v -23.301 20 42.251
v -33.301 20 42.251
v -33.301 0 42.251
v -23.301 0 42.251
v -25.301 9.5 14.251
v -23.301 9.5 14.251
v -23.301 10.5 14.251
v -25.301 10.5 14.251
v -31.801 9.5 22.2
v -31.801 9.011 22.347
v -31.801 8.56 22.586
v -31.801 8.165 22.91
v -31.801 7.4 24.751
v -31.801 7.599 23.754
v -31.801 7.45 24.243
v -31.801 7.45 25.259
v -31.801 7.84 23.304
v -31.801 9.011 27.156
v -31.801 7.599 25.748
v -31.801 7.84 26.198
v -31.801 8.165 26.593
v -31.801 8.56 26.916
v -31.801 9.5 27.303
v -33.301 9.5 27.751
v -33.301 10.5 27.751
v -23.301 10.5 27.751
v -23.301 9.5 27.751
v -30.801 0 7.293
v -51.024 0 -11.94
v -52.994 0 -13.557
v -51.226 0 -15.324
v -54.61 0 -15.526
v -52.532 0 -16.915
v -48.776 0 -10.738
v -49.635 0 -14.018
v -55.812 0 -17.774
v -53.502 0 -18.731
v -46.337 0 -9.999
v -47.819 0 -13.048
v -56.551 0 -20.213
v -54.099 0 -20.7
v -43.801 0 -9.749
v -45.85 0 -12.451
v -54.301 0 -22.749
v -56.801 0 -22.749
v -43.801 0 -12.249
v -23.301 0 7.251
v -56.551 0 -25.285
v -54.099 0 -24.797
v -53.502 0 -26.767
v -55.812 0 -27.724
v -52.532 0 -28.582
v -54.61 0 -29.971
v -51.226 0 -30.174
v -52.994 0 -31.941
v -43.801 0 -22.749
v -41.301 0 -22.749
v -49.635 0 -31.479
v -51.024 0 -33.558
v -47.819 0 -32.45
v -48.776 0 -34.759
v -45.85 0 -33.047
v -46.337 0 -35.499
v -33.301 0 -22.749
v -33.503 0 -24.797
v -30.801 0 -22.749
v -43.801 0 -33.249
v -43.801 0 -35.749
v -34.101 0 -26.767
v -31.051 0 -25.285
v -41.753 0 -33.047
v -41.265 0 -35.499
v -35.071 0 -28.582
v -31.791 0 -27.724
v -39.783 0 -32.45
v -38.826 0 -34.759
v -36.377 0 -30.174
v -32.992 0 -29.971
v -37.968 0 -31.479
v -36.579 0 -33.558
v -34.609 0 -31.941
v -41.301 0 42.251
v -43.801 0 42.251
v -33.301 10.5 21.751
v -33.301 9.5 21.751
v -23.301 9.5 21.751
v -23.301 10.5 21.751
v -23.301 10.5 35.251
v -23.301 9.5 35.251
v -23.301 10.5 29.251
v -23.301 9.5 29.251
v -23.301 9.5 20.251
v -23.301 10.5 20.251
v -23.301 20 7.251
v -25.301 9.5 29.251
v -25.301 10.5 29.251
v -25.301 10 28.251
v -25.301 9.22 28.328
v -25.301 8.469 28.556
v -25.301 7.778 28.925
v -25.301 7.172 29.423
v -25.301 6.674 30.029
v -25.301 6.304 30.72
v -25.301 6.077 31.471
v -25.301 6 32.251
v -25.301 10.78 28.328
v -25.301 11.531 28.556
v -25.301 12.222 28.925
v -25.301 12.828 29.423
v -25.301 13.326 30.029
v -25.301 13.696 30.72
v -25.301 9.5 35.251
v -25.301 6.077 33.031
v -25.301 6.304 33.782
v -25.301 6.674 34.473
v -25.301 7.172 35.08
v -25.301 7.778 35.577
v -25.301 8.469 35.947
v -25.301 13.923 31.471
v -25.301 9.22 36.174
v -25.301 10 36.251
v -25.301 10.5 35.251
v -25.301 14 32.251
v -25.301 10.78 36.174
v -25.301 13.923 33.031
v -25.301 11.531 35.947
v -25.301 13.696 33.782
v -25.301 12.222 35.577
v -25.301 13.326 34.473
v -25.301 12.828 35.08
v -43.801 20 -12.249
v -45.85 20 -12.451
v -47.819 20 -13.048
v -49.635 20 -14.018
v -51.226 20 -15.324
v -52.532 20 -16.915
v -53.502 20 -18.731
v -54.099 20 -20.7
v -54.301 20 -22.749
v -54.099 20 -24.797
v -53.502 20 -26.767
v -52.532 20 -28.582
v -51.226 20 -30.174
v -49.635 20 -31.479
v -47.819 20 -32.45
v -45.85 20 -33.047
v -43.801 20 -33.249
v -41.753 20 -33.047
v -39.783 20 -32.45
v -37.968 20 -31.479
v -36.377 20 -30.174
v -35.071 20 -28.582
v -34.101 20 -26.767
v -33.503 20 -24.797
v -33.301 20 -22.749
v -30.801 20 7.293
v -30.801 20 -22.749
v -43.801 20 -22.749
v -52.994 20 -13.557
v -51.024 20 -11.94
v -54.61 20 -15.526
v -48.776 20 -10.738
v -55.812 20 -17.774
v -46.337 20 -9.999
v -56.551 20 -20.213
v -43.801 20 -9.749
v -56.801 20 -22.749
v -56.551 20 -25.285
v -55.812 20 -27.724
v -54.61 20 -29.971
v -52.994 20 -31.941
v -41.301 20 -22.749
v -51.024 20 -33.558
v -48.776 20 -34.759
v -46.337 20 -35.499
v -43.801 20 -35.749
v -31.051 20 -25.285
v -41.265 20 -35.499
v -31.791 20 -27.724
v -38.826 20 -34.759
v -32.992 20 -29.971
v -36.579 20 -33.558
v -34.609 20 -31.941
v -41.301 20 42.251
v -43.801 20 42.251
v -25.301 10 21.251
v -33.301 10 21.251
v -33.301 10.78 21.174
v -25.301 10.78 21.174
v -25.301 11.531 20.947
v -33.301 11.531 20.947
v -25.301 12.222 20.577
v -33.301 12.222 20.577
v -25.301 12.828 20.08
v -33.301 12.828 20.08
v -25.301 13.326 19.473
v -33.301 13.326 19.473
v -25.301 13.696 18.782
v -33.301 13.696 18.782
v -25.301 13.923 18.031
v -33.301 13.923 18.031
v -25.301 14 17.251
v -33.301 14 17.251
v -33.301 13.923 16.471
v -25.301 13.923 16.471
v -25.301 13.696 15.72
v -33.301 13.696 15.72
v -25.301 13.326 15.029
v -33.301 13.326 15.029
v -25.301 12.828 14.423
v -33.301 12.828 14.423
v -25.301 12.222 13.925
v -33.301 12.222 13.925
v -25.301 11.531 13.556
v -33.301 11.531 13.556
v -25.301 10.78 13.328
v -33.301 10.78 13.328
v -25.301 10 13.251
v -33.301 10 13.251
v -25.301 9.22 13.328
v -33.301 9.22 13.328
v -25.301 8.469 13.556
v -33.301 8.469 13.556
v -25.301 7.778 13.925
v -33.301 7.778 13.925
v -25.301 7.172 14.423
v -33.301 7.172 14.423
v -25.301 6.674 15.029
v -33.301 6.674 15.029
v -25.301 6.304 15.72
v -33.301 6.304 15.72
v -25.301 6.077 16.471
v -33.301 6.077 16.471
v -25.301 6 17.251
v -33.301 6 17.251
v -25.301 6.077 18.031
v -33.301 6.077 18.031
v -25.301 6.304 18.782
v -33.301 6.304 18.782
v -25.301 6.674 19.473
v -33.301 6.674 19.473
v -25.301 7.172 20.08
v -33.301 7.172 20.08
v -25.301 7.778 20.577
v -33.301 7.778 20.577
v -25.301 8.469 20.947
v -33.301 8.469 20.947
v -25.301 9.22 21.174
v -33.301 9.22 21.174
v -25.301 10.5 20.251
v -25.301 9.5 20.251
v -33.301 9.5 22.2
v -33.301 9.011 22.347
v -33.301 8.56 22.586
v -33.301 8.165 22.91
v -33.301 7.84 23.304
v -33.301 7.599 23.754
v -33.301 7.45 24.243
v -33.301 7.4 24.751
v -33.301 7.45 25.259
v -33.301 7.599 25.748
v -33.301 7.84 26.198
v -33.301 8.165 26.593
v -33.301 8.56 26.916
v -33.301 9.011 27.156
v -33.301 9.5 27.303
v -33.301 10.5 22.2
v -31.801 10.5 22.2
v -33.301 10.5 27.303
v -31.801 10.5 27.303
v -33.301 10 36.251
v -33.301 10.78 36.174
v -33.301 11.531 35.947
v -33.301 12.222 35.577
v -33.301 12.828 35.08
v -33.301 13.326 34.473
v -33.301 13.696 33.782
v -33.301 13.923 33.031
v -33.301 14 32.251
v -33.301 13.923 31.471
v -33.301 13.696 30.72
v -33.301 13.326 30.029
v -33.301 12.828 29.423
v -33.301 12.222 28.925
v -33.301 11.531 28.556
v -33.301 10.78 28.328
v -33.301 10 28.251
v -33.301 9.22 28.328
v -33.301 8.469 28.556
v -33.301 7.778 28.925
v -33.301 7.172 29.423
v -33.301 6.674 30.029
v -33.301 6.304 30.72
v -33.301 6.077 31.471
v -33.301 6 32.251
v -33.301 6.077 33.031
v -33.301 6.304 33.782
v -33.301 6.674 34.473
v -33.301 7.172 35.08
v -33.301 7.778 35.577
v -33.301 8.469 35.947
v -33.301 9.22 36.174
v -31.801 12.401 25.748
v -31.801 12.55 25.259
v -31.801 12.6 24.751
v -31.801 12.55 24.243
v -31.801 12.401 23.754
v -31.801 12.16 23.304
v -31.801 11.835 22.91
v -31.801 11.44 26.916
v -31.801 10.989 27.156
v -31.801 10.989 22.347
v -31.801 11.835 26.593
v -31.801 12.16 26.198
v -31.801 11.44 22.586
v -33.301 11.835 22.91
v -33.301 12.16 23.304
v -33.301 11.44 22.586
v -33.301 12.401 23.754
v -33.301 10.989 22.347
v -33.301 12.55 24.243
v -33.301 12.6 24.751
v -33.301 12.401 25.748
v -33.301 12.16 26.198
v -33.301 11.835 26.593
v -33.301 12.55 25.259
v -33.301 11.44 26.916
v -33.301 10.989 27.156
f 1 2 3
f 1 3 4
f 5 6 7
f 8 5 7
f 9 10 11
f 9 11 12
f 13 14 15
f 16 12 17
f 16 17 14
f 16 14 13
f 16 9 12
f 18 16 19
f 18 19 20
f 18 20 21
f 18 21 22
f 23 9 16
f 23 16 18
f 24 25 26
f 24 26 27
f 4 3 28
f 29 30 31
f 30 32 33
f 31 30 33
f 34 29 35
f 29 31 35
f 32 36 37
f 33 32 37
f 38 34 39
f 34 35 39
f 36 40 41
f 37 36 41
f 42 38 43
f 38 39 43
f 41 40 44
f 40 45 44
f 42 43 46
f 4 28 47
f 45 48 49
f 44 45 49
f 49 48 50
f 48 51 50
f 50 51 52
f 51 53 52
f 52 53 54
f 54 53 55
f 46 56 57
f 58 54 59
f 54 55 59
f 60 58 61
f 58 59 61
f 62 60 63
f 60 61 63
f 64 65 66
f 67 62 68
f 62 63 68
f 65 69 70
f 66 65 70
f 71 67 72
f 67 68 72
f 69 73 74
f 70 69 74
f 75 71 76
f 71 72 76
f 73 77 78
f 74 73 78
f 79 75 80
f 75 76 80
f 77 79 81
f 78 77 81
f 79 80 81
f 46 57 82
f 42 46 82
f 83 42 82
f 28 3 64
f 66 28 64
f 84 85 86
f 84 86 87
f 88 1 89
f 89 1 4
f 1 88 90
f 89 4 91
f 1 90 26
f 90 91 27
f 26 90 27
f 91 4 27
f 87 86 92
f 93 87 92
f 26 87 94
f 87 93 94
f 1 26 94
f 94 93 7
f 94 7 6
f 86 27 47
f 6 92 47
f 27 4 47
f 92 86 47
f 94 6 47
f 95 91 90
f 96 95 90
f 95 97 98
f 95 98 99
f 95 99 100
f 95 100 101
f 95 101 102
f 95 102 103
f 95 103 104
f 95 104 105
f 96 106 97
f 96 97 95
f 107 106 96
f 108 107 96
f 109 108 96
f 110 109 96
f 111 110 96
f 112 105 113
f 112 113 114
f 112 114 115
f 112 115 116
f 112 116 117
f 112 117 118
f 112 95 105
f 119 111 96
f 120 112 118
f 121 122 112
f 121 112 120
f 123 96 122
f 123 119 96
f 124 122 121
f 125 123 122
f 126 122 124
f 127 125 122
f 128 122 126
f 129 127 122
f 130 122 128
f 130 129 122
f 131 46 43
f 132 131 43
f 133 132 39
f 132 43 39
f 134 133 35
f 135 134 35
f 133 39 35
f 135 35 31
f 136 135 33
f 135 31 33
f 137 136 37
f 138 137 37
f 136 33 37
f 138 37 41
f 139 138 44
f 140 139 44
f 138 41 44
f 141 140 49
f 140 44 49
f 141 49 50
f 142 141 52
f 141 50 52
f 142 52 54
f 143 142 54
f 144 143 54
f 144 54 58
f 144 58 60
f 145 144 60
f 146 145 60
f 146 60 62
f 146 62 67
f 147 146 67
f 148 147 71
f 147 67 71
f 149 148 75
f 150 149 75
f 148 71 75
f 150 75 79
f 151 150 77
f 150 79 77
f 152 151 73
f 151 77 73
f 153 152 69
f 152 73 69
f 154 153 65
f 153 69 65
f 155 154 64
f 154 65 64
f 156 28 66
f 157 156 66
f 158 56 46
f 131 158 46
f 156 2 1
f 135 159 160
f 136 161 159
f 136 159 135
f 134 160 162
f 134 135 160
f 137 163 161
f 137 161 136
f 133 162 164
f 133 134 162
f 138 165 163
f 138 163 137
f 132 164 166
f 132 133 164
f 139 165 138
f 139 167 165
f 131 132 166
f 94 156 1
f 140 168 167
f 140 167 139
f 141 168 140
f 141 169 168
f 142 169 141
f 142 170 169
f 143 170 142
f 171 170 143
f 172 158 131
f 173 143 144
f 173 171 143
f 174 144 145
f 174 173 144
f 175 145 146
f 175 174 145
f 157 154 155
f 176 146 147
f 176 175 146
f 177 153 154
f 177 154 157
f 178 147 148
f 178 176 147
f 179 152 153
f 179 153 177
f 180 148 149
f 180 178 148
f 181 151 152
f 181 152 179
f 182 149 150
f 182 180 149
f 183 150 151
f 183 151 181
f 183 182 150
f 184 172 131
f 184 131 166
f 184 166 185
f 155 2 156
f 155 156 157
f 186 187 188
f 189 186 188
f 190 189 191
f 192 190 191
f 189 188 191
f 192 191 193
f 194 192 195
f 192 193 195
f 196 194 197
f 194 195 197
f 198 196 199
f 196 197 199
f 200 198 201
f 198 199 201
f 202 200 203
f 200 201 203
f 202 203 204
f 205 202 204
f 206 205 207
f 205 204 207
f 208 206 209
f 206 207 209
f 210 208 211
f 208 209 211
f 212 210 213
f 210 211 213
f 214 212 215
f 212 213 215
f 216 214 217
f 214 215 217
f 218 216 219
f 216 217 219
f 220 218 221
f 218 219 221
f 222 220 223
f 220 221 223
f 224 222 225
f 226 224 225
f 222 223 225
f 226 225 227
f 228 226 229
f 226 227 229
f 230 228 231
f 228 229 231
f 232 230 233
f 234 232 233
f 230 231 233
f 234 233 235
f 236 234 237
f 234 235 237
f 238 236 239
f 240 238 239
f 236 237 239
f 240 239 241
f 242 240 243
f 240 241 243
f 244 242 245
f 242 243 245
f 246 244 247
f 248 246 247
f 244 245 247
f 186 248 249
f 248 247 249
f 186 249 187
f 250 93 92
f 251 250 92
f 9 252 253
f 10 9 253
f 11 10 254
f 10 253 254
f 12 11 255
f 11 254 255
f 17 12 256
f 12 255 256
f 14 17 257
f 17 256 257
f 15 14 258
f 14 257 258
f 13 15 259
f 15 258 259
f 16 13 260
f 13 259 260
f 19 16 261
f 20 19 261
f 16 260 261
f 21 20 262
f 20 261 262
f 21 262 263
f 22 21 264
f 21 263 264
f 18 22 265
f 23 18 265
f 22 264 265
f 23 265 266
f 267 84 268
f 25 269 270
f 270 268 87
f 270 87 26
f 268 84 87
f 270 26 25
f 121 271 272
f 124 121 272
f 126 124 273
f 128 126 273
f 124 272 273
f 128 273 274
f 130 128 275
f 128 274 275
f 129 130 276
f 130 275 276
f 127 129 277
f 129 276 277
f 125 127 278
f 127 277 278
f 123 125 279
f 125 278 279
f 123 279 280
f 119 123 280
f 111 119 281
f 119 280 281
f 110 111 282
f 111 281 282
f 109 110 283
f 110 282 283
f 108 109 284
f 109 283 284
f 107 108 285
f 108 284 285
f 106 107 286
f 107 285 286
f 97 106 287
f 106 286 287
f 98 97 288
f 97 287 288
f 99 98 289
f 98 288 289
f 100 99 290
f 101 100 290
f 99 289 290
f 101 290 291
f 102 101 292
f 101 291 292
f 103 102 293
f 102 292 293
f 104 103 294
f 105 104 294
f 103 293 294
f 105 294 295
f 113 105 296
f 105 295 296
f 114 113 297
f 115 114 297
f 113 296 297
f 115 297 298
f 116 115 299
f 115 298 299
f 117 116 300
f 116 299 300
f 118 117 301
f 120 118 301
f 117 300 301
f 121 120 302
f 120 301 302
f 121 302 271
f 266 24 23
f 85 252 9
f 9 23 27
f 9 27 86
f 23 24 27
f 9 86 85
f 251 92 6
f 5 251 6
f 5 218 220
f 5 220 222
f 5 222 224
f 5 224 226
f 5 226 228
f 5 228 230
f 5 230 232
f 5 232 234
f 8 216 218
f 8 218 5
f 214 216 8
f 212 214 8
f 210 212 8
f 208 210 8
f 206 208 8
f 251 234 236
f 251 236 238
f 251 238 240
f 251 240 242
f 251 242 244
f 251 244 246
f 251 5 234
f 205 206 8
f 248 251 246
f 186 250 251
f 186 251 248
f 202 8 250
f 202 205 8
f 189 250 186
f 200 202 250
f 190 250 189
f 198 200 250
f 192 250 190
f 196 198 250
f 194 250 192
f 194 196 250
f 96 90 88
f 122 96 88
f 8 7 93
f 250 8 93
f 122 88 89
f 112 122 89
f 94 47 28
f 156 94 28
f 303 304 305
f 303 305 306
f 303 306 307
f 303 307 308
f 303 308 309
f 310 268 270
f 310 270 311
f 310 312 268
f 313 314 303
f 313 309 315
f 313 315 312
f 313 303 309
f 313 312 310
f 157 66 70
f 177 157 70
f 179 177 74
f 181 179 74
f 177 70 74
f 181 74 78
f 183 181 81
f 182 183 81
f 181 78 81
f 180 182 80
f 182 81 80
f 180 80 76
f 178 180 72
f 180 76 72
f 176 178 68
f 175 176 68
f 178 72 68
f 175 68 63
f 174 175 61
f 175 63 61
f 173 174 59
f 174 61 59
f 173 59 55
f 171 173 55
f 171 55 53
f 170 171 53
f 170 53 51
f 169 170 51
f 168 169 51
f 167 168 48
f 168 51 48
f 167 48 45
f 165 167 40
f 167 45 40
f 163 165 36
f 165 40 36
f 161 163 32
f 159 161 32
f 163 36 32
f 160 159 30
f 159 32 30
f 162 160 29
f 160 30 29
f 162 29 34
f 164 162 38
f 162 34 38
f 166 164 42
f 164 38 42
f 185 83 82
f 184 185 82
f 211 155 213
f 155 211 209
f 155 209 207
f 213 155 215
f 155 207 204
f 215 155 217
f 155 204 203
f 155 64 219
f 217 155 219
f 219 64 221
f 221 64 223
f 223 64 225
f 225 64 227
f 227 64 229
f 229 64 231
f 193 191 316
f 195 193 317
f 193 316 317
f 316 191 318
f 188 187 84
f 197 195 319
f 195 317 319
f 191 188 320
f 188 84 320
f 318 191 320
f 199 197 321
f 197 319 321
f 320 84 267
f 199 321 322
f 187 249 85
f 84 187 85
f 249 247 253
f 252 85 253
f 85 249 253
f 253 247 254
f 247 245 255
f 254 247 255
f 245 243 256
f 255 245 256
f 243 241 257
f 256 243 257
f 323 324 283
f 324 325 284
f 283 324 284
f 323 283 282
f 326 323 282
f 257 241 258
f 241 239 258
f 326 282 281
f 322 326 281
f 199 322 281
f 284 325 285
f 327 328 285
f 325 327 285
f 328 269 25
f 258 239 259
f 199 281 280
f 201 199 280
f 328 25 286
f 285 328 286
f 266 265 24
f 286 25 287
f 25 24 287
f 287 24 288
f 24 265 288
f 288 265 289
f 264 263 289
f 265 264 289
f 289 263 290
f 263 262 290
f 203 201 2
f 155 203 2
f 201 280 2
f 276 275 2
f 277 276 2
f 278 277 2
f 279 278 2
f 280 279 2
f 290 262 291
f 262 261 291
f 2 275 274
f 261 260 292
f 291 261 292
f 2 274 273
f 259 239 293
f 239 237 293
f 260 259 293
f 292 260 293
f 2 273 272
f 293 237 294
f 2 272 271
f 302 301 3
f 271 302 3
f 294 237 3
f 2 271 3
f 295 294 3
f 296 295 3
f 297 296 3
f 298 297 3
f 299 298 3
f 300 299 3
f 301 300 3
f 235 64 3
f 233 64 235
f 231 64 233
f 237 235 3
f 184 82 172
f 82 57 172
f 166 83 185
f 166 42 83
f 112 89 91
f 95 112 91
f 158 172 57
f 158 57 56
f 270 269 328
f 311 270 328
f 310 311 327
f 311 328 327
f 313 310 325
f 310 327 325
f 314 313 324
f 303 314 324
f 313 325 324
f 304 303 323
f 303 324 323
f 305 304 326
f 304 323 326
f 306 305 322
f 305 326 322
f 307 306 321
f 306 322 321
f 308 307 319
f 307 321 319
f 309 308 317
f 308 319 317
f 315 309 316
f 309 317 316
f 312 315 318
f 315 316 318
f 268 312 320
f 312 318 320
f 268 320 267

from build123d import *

# Parameters (mm, degrees)
BOSS_EXTRUDE1_DEPTH = 20
SKETCH2_R           = 4
CUT_EXTRUDE2_DEPTH  = 8
CUT_EXTRUDE4_DEPTH  = 10
SKETCH4_R           = 2.6
CUT_EXTRUDE5_DEPTH  = 1.5
SKETCH6_W           = 2.5
SKETCH6_H           = 20
SKETCH6_W_2         = 10
BOSS_EXTRUDE3_DEPTH = 5


with BuildPart() as part:
    # Sketch1 → Boss-Extrude1 (new body)
    with BuildSketch(Plane(origin=(0, 0, 0), x_dir=(1, 0, 0), z_dir=(0, 1, 0))):
        with BuildLine():
            Line((-30.801242739, -7.293134051), (-30.801242739, 22.74889672))
            ThreePointArc((-30.801242739, 22.74889672), (-52.993630894, 31.941284876), (-43.801242739, 9.74889672))
            Line((-43.801242739, 9.74889672), (-43.801242739, -37.25110328))
            Line((-43.801242739, -37.25110328), (-41.301242739, -37.25110328))
            Line((-41.301242739, -37.25110328), (-41.301242739, 22.74889672))
            Line((-41.301242739, 22.74889672), (-43.801242739, 22.74889672))
            Line((-43.801242739, 22.74889672), (-43.801242739, 12.24889672))
            ThreePointArc((-43.801242739, 12.24889672), (-51.225863941, 30.173517923), (-33.301242739, 22.74889672))
            Line((-33.301242739, 22.74889672), (-33.301242739, -37.25110328))
            Line((-33.301242739, -37.25110328), (-23.301242739, -37.25110328))
            Line((-23.301242739, -37.25110328), (-23.301242739, -7.25110328))
            Line((-23.301242739, -7.25110328), (-30.801242739, -7.293134051))
        make_face()
    extrude(amount=BOSS_EXTRUDE1_DEPTH)

    # Sketch2 → Cut-Extrude2 (cut)
    with BuildSketch(Plane.ZY.offset(33.301242739)):
        with Locations((17.25110328, 10)):
            Circle(SKETCH2_R)
        with Locations((32.25110328, 10)):
            Circle(SKETCH2_R)
    extrude(amount=-CUT_EXTRUDE2_DEPTH, mode=Mode.SUBTRACT)

    # Sketch3 → Cut-Extrude4 (cut)
    with BuildSketch(Plane(origin=(-23.301242739, 0, 0), x_dir=(0, 0, -1), z_dir=(1, 0, 0))):
        Polygon((-24.75110328, 10), (-27.75110328, 10.5), (-27.75110328, 9.5), align=None)
        Polygon((-21.75110328, 10.5), (-27.75110328, 10.5), (-24.75110328, 10), align=None)
        Polygon((-21.75110328, 10.5), (-24.75110328, 10), (-21.75110328, 9.5), align=None)
        Polygon((-21.75110328, 9.5), (-24.75110328, 10), (-27.75110328, 9.5), align=None)
        Polygon((-17.25110328, 10), (-20.25110328, 10.5), (-20.25110328, 9.5), align=None)
        Polygon((-14.25110328, 10.5), (-17.25110328, 10), (-14.25110328, 9.5), align=None)
        Polygon((-14.25110328, 10.5), (-20.25110328, 10.5), (-17.25110328, 10), align=None)
        Polygon((-14.25110328, 9.5), (-17.25110328, 10), (-20.25110328, 9.5), align=None)
        Polygon((-29.25110328, 10.5), (-32.25110328, 10), (-29.25110328, 9.5), align=None)
        Polygon((-29.25110328, 10.5), (-35.25110328, 10.5), (-32.25110328, 10), align=None)
        Polygon((-32.25110328, 10), (-35.25110328, 10.5), (-35.25110328, 9.5), align=None)
        Polygon((-29.25110328, 9.5), (-32.25110328, 10), (-35.25110328, 9.5), align=None)
    extrude(amount=-CUT_EXTRUDE4_DEPTH, mode=Mode.SUBTRACT)

    # Sketch4 → Cut-Extrude5 (cut)
    with BuildSketch(Plane.ZY.offset(33.301242739)):
        with Locations((24.75110328, 10)):
            Circle(SKETCH4_R)
    extrude(amount=-CUT_EXTRUDE5_DEPTH, mode=Mode.SUBTRACT)

    # Sketch6 → Boss-Extrude3 (add)
    with BuildSketch(Plane.XY.offset(37.25110328)):
        with Locations((-42.551242739, 10)):
            Rectangle(SKETCH6_W, SKETCH6_H)
        with Locations((-28.301242739, 10)):
            Rectangle(SKETCH6_W_2, SKETCH6_H)
    extrude(amount=BOSS_EXTRUDE3_DEPTH)


solid = part.part
